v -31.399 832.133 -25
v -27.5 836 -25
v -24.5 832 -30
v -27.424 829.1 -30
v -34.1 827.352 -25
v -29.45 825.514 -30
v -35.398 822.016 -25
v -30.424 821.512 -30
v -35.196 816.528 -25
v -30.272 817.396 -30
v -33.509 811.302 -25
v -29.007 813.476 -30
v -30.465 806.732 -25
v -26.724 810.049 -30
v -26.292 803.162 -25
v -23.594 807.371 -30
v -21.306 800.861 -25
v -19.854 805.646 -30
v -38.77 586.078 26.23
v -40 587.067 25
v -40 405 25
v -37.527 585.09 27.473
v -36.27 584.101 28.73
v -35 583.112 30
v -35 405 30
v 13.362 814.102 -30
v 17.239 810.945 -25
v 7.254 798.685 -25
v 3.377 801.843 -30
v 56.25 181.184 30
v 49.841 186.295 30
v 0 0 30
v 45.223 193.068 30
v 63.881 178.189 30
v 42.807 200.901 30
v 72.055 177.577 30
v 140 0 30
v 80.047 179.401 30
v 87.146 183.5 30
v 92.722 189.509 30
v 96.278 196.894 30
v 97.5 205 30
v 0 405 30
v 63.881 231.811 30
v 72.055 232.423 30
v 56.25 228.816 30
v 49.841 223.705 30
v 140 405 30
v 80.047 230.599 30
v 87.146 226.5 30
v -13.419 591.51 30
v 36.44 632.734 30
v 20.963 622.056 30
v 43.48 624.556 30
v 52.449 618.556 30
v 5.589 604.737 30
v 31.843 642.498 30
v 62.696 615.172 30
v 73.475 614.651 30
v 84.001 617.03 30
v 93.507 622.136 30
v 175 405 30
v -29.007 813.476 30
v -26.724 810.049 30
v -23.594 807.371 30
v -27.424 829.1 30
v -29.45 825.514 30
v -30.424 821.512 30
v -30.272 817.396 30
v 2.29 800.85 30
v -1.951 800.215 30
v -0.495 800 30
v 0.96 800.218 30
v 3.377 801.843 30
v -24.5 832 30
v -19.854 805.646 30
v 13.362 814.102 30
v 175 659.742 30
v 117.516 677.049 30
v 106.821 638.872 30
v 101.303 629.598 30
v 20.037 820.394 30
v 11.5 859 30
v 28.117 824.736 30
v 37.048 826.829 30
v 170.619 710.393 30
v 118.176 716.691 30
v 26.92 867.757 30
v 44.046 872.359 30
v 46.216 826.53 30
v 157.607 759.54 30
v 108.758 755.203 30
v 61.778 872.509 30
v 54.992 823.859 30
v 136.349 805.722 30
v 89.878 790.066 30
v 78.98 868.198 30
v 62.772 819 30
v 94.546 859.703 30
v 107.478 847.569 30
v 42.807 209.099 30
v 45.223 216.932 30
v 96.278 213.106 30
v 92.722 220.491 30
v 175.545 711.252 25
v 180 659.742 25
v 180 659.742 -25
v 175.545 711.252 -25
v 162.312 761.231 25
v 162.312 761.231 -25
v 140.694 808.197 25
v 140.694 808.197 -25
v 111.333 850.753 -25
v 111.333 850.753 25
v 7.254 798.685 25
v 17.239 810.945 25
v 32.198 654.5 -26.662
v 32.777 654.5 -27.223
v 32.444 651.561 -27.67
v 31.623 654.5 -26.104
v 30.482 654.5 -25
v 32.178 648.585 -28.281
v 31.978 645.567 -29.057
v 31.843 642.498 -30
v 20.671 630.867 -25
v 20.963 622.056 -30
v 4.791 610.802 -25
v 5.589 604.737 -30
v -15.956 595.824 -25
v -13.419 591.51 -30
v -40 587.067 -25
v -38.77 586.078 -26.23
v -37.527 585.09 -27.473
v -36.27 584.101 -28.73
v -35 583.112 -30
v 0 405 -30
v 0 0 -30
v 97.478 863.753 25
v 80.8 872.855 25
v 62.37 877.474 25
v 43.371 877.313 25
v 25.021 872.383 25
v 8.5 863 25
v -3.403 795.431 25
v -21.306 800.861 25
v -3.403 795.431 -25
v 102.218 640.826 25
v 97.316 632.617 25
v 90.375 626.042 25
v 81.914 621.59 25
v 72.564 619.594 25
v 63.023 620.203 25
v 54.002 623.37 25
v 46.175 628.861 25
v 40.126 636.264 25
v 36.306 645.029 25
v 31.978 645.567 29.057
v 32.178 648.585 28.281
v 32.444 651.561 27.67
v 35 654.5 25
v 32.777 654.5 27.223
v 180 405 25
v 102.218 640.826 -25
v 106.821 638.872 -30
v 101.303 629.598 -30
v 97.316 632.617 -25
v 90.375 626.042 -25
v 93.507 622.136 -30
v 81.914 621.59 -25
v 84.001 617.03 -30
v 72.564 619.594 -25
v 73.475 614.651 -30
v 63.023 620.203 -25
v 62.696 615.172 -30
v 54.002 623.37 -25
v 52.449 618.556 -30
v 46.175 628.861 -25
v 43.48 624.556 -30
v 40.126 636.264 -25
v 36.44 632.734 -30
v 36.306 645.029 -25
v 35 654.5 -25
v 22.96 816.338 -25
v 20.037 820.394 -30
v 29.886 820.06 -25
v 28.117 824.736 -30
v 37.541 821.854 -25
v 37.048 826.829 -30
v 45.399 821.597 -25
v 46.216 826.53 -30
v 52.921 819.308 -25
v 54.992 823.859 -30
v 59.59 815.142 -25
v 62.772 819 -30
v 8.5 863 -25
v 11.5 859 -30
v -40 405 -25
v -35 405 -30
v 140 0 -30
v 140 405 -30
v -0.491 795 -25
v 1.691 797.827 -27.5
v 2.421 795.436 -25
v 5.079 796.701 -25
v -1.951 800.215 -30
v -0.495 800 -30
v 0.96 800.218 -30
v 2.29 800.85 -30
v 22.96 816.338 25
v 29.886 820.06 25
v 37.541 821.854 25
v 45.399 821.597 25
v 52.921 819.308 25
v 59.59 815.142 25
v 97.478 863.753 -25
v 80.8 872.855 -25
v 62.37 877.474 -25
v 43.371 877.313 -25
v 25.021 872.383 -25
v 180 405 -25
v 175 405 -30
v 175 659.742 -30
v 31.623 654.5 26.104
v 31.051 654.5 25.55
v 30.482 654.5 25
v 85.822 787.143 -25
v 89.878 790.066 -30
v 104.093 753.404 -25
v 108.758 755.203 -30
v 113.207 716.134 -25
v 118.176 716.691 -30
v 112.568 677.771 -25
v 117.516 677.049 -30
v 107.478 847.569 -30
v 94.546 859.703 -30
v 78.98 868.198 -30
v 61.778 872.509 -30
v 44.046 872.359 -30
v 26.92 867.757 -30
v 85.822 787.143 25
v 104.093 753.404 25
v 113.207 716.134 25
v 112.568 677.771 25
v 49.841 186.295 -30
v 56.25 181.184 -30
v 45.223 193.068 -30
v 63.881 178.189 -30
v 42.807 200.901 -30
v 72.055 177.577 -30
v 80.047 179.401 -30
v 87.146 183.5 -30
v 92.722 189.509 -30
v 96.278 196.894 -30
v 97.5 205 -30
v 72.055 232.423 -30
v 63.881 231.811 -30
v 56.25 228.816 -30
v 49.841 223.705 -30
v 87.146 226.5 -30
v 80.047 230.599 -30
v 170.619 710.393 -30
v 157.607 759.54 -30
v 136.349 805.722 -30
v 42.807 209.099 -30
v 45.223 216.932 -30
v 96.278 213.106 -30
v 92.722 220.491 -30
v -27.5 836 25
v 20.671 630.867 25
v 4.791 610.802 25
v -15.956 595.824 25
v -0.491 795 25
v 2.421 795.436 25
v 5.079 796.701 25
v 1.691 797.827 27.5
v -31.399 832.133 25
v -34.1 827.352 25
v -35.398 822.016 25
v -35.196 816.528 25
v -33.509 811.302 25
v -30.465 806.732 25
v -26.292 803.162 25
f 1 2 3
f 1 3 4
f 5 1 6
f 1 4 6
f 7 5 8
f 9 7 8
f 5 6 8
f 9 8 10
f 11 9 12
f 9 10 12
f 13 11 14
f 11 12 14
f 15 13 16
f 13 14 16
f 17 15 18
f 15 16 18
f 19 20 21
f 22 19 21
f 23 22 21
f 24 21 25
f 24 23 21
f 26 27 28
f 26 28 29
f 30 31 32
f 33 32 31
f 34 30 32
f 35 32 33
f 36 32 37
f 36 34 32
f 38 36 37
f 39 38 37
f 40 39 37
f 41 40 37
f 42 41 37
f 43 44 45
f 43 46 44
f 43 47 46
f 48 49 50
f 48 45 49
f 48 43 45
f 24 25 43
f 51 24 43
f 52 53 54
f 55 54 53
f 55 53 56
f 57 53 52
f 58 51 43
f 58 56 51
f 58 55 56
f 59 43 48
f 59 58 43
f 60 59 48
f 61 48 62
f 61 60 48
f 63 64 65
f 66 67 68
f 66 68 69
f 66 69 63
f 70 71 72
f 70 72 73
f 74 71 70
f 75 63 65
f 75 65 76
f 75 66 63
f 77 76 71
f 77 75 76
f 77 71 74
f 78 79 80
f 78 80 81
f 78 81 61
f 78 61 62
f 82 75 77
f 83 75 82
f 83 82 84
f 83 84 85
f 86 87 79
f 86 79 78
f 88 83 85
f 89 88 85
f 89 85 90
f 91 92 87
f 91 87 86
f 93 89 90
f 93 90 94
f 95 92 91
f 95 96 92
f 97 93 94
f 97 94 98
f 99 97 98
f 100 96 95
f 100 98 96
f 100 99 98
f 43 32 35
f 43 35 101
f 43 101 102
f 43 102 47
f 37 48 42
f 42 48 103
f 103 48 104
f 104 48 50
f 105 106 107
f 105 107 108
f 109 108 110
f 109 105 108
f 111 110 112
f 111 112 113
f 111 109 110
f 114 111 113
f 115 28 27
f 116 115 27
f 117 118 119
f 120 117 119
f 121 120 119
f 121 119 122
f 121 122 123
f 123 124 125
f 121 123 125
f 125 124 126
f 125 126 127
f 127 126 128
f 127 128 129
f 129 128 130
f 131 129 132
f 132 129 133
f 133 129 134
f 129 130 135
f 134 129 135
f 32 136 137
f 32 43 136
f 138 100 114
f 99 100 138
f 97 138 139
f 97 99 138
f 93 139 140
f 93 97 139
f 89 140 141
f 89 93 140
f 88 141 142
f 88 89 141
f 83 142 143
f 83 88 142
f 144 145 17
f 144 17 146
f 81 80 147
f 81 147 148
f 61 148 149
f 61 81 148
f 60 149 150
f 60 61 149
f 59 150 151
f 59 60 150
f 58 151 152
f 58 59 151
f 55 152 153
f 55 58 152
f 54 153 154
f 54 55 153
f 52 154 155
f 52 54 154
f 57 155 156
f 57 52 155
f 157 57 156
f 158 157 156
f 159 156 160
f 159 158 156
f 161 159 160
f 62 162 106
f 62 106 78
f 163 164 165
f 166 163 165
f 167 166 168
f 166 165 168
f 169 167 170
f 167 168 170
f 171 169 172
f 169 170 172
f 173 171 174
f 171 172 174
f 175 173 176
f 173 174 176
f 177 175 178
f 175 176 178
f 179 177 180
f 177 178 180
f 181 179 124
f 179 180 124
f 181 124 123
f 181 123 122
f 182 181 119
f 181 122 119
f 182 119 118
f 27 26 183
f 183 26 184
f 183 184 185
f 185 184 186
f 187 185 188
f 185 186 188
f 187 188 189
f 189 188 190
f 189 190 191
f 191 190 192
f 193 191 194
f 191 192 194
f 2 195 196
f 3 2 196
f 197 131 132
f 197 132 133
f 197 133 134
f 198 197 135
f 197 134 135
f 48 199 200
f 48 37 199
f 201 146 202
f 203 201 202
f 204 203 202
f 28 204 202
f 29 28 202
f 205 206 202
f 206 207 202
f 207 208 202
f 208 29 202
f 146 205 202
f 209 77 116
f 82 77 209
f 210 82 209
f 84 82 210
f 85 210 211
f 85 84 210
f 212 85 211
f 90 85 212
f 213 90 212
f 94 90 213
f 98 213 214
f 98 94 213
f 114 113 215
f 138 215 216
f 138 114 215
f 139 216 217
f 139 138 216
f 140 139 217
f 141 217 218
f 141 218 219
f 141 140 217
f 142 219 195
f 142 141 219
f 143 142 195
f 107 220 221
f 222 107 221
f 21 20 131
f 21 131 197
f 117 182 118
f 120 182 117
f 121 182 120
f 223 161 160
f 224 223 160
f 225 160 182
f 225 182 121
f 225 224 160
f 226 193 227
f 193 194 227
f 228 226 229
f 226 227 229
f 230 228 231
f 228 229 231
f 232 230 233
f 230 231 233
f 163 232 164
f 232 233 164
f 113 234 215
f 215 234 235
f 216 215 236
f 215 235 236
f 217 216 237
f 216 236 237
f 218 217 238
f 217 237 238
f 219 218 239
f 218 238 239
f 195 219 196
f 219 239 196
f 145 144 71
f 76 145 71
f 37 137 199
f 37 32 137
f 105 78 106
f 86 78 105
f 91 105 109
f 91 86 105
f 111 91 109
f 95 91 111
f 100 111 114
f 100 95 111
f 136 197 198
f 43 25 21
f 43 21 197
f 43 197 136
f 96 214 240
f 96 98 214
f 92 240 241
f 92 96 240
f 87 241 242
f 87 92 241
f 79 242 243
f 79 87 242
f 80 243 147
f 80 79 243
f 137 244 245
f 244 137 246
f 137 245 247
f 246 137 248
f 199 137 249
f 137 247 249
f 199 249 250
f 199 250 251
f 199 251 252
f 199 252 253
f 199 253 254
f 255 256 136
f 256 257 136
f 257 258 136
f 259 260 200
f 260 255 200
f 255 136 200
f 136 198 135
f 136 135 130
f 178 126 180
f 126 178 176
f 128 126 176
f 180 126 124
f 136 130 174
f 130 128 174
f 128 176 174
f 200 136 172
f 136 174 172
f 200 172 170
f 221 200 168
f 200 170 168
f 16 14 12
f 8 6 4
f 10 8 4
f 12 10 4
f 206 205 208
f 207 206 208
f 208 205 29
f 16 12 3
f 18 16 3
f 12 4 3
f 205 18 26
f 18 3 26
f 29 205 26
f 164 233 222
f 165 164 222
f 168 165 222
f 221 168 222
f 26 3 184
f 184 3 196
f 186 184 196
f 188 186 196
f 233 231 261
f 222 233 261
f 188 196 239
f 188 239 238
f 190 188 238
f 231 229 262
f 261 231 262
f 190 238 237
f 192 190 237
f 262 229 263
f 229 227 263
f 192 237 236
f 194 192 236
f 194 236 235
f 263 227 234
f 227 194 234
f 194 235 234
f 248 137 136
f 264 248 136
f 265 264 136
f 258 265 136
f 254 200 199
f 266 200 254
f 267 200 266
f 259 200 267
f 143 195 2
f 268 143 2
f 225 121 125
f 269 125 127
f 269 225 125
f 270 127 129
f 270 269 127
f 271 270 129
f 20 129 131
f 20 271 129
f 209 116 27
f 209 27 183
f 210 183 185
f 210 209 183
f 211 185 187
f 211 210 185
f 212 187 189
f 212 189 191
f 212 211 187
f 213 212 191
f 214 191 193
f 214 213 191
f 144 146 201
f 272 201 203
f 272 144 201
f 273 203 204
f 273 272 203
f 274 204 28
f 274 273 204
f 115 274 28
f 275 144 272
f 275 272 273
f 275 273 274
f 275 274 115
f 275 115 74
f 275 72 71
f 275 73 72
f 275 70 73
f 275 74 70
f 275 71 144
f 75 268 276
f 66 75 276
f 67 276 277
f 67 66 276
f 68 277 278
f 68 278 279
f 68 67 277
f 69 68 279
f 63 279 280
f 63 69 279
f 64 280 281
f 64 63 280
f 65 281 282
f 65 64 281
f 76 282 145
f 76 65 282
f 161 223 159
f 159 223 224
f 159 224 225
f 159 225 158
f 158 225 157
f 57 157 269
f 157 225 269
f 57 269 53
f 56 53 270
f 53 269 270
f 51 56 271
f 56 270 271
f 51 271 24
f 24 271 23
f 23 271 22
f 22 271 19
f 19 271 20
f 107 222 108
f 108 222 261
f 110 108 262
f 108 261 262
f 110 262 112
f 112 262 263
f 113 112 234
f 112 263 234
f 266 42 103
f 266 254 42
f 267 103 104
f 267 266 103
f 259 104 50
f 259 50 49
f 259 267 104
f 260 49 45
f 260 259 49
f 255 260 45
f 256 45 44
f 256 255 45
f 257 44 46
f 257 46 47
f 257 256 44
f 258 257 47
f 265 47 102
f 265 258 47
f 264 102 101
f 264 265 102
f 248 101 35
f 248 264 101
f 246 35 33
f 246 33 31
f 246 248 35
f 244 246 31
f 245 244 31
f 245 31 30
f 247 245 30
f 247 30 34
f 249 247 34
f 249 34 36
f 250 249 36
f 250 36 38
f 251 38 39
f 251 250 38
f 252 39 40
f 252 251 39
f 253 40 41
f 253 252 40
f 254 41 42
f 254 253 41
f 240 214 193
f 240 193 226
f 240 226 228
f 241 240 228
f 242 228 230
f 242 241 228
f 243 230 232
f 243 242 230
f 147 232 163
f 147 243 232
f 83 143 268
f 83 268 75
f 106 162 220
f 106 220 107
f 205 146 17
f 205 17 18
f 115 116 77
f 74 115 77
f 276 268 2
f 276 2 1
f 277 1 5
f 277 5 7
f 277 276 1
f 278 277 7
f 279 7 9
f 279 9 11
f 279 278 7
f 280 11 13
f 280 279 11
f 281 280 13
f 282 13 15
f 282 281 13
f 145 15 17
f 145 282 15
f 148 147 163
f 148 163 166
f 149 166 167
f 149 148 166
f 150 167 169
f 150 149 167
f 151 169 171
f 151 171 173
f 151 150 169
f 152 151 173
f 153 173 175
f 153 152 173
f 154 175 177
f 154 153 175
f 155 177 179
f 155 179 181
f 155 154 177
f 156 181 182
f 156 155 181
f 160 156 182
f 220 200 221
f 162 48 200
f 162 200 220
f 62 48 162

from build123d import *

# Parameters (mm, degrees)
SKETCH_1_R      = 27.5
EXTRUDE_1_DEPTH = 30
CHAMFER_1_SIZE  = 5


with BuildPart() as part:
    # 草图1 → 凸台-拉伸1 (new, symmetric)
    with BuildSketch(Plane.XY):
        with BuildLine():
            Line((140, 405), (180, 405))
            Line((180, 405), (180, 659.74236495))
            ThreePointArc((180, 659.74236495), (162.31188427, 761.231280601), (111.333333333, 850.752545017))
            ThreePointArc((111.333333333, 850.752545017), (62.369816768, 877.473662126), (8.5, 863))
            Line((8.5, 863), (-27.5, 836))
            ThreePointArc((-27.5, 836), (-35.196294357, 816.527826528), (-21.305524623, 800.861142044))
            Line((-21.305524623, 800.861142044), (-3.402762311, 795.430571022))
            ThreePointArc((-3.402762311, 795.430571022), (2.420792013, 795.436058657), (7.253794336, 798.685043674))
            Line((7.253794336, 798.685043674), (17.238616993, 810.944868978))
            ThreePointArc((17.238616993, 810.944868978), (37.541078237, 821.853723084), (59.589937945, 815.142477595))
            ThreePointArc((59.589937945, 815.142477595), (109.84673197, 735.06182538), (102.218185324, 640.825624899))
            ThreePointArc((102.218185324, 640.825624899), (63.022768685, 620.202503835), (35, 654.5))
            Line((35, 654.5), (30.481942633, 654.5))
            ThreePointArc((30.481942633, 654.5), (4.791252117, 610.80152605), (-40, 587.067332603))
            Line((-40, 587.067332603), (-40, 405))
            Line((-40, 405), (0, 405))
            Line((0, 405), (0, 0))
            Line((0, 0), (140, 0))
            Line((140, 0), (140, 405))
        make_face()
        with Locations((70, 205)):
            Circle(SKETCH_1_R, mode=Mode.SUBTRACT)
    extrude(amount=EXTRUDE_1_DEPTH, both=True)

    # 倒角1
    # the kernel refuses this chamfer: 5 mm, written as the material it takes off along each edge
    with BuildSketch(Plane(origin=(-59.5, 678, -30), x_dir=(0.9931437230377144, -0.11689972365573639, 0), z_dir=(0.11689972365573639, 0.9931437230377144, 0))) as chamfer_1_piece_1:
        Polygon((93, -CHAMFER_1_SIZE), (93 + CHAMFER_1_SIZE, 0), (93, 0), align=None)
    revolve(axis=Axis((-59.5, 678, -30), (0, 0, -1)), revolution_arc=79.106771972, mode=Mode.SUBTRACT)
    with BuildSketch(Plane(origin=(-59.5, 678, 30), x_dir=(0.9931437230377144, -0.11689972365573639, 0), z_dir=(0.11689972365573639, 0.9931437230377144, 0))) as chamfer_1_piece_2:
        Polygon((93 + CHAMFER_1_SIZE, 0), (93, CHAMFER_1_SIZE), (93, 0), align=None)
    revolve(axis=Axis((-59.5, 678, 30), (0, 0, -1)), revolution_arc=79.106771972, mode=Mode.SUBTRACT)
    with BuildSketch(Plane(origin=(180, 392.14158506, -30), x_dir=(0.0274958766105877, 0, 0.9996219169112968), z_dir=(0, 1, 0))) as chamfer_1_piece_3:
        Polygon((CHAMFER_1_SIZE * 0.999621916911, -CHAMFER_1_SIZE * 0.0274958766106), (-CHAMFER_1_SIZE * 0.0274958766106, -CHAMFER_1_SIZE * 0.999621916911), (0, 0), align=None)
    extrude(amount=267.60077989, mode=Mode.SUBTRACT)
    with BuildSketch(Plane(origin=(-120, 659.74236495, -30), x_dir=(1, 0, 0), z_dir=(0, -1, 0))) as chamfer_1_piece_4:
        Polygon((300, CHAMFER_1_SIZE), (300 - CHAMFER_1_SIZE, 0), (300, 0), align=None)
    revolve(axis=Axis((-120, 659.74236495, -30), (0, 0, 1)), revolution_arc=39.546229231, mode=Mode.SUBTRACT)
    with BuildSketch(Plane(origin=(53.5, 803, -30), x_dir=(0.7711111111111113, 0.6367006002203762, 0), z_dir=(0.6367006002203762, -0.7711111111111113, 0))) as chamfer_1_piece_5:
        Polygon((75, CHAMFER_1_SIZE), (75 - CHAMFER_1_SIZE, 0), (75, 0), align=None)
    revolve(axis=Axis((53.5, 803, -30), (0, 0, 1)), revolution_arc=87.323668415, mode=Mode.SUBTRACT)
    with BuildSketch(Plane(origin=(8.5, 863, -30), x_dir=(-0.01649752596635013, 0.02199670128846693, 0.9996219169112968), z_dir=(-0.8000000000000013, -0.5999999999999984, 0))) as chamfer_1_piece_6:
        Polygon((CHAMFER_1_SIZE * 0.999621916911, -CHAMFER_1_SIZE * 0.0274958766106), (-CHAMFER_1_SIZE * 0.0274958766106, -CHAMFER_1_SIZE * 0.999621916911), (0, 0), align=None)
    extrude(amount=45, mode=Mode.SUBTRACT)
    with BuildSketch(Plane(origin=(-15.5, 820, -30), x_dir=(-0.6000000000000103, 0.7999999999999922, 0), z_dir=(0.7999999999999922, 0.6000000000000103, 0))) as chamfer_1_piece_7:
        Polygon((20, CHAMFER_1_SIZE), (20 - CHAMFER_1_SIZE, 0), (20, 0), align=None)
    revolve(axis=Axis((-15.5, 820, -30), (0, 0, 1)), revolution_arc=126.255608056, mode=Mode.SUBTRACT)
    with BuildSketch(Plane(origin=(-21.305524623, 800.861142044, -30), x_dir=(-0.007981399434105696, -0.02631198384115636, 0.9996219169112971), z_dir=(0.9569428977956573, -0.29027623112898887, 0))) as chamfer_1_piece_8:
        Polygon((CHAMFER_1_SIZE * 0.999621916911, -CHAMFER_1_SIZE * 0.0274958766106), (-CHAMFER_1_SIZE * 0.0274958766106, -CHAMFER_1_SIZE * 0.999621916911), (0, 0), align=None)
    extrude(amount=18.708286934, mode=Mode.SUBTRACT)
    with BuildSketch(Plane(origin=(-0.5, 805, -30), x_dir=(-0.29027623112897577, -0.9569428977956612, 0), z_dir=(-0.9569428977956612, 0.29027623112897577, 0))) as chamfer_1_piece_9:
        Polygon((10, CHAMFER_1_SIZE), (10 - CHAMFER_1_SIZE, 0), (10, 0), align=None)
    revolve(axis=Axis((-0.5, 805, -30), (0, 0, 1)), revolution_arc=67.7139403, mode=Mode.SUBTRACT)
    with BuildSketch(Plane(origin=(7.253794336, 798.685043674, -30), x_dir=(0.021319737231601184, -0.01736352599446127, 0.9996219169112965), z_dir=(0.6314956326132553, 0.7753794335616496, 0))) as chamfer_1_piece_10:
        Polygon((CHAMFER_1_SIZE * 0.999621916911, -CHAMFER_1_SIZE * 0.0274958766106), (-CHAMFER_1_SIZE * 0.0274958766106, -CHAMFER_1_SIZE * 0.999621916911), (0, 0), align=None)
    extrude(amount=15.811388301, mode=Mode.SUBTRACT)
    with BuildSketch(Plane(origin=(40.5, 792, -30), x_dir=(-0.7753794335616501, 0.6314956326132546, 0), z_dir=(-0.6314956326132546, -0.7753794335616501, 0))) as chamfer_1_piece_11:
        Polygon((30, -CHAMFER_1_SIZE), (30 + CHAMFER_1_SIZE, 0), (30, 0), align=None)
    revolve(axis=Axis((40.5, 792, -30), (0, 0, -1)), revolution_arc=90.358237971, mode=Mode.SUBTRACT)
    with BuildSketch(Plane(origin=(-35.85975178, 699.430089618, -30), x_dir=(0.6363312648327024, 0.7714159198489573, 0), z_dir=(-0.7714159198489573, 0.6363312648327024, 0))) as chamfer_1_piece_12:
        Polygon((150, -CHAMFER_1_SIZE), (150 + CHAMFER_1_SIZE, 0), (150, 0), align=None)
    revolve(axis=Axis((-35.85975178, 699.430089618, -30), (0, 0, -1)), revolution_arc=73.479048371, mode=Mode.SUBTRACT)
    with BuildSketch(Plane(origin=(70, 654.5, -30), x_dir=(0.920519580694994, -0.39069643146196303, 0), z_dir=(0.39069643146196303, 0.920519580694994, 0))) as chamfer_1_piece_13:
        Polygon((35, -CHAMFER_1_SIZE), (35 + CHAMFER_1_SIZE, 0), (35, 0), align=None)
    revolve(axis=Axis((70, 654.5, -30), (0, 0, -1)), revolution_arc=178.077418405, mode=Mode.SUBTRACT)
    with BuildSketch(Plane(origin=(180, 392.14158506, 30), x_dir=(0.0274958766105877, 0, -0.9996219169112968), z_dir=(0, 1, 0))) as chamfer_1_piece_14:
        Polygon((CHAMFER_1_SIZE * 0.999621916911, CHAMFER_1_SIZE * 0.0274958766106), (-CHAMFER_1_SIZE * 0.0274958766106, CHAMFER_1_SIZE * 0.999621916911), (0, 0), align=None)
    extrude(amount=267.60077989, mode=Mode.SUBTRACT)
    with BuildSketch(Plane(origin=(-120, 659.74236495, 30), x_dir=(1, 0, 0), z_dir=(0, -1, 0))) as chamfer_1_piece_15:
        Polygon((300, -CHAMFER_1_SIZE), (300 - CHAMFER_1_SIZE, 0), (300, 0), align=None)
    revolve(axis=Axis((-120, 659.74236495, 30), (0, 0, 1)), revolution_arc=39.546229231, mode=Mode.SUBTRACT)
    with BuildSketch(Plane(origin=(53.5, 803, 30), x_dir=(0.7711111111111113, 0.6367006002203762, 0), z_dir=(0.6367006002203762, -0.7711111111111113, 0))) as chamfer_1_piece_16:
        Polygon((75, -CHAMFER_1_SIZE), (75 - CHAMFER_1_SIZE, 0), (75, 0), align=None)
    revolve(axis=Axis((53.5, 803, 30), (0, 0, 1)), revolution_arc=87.323668415, mode=Mode.SUBTRACT)
    with BuildSketch(Plane(origin=(8.5, 863, 30), x_dir=(-0.01649752596635013, 0.02199670128846693, -0.9996219169112968), z_dir=(-0.8000000000000013, -0.5999999999999984, 0))) as chamfer_1_piece_17:
        Polygon((CHAMFER_1_SIZE * 0.999621916911, CHAMFER_1_SIZE * 0.0274958766106), (-CHAMFER_1_SIZE * 0.0274958766106, CHAMFER_1_SIZE * 0.999621916911), (0, 0), align=None)
    extrude(amount=45, mode=Mode.SUBTRACT)
    with BuildSketch(Plane(origin=(-15.5, 820, 30), x_dir=(-0.6000000000000103, 0.7999999999999922, 0), z_dir=(0.7999999999999922, 0.6000000000000103, 0))) as chamfer_1_piece_18:
        Polygon((20, -CHAMFER_1_SIZE), (20 - CHAMFER_1_SIZE, 0), (20, 0), align=None)
    revolve(axis=Axis((-15.5, 820, 30), (0, 0, 1)), revolution_arc=126.255608056, mode=Mode.SUBTRACT)
    with BuildSketch(Plane(origin=(-21.305524623, 800.861142044, 30), x_dir=(-0.007981399434105696, -0.02631198384115636, -0.9996219169112971), z_dir=(0.9569428977956573, -0.29027623112898887, 0))) as chamfer_1_piece_19:
        Polygon((CHAMFER_1_SIZE * 0.999621916911, CHAMFER_1_SIZE * 0.0274958766106), (-CHAMFER_1_SIZE * 0.0274958766106, CHAMFER_1_SIZE * 0.999621916911), (0, 0), align=None)
    extrude(amount=18.708286934, mode=Mode.SUBTRACT)
    with BuildSketch(Plane(origin=(-0.5, 805, 30), x_dir=(-0.29027623112897577, -0.9569428977956612, 0), z_dir=(-0.9569428977956612, 0.29027623112897577, 0))) as chamfer_1_piece_20:
        Polygon((10, -CHAMFER_1_SIZE), (10 - CHAMFER_1_SIZE, 0), (10, 0), align=None)
    revolve(axis=Axis((-0.5, 805, 30), (0, 0, 1)), revolution_arc=67.7139403, mode=Mode.SUBTRACT)
    with BuildSketch(Plane(origin=(7.253794336, 798.685043674, 30), x_dir=(0.021319737231601184, -0.01736352599446127, -0.9996219169112965), z_dir=(0.6314956326132553, 0.7753794335616496, 0))) as chamfer_1_piece_21:
        Polygon((CHAMFER_1_SIZE * 0.999621916911, CHAMFER_1_SIZE * 0.0274958766106), (-CHAMFER_1_SIZE * 0.0274958766106, CHAMFER_1_SIZE * 0.999621916911), (0, 0), align=None)
    extrude(amount=15.811388301, mode=Mode.SUBTRACT)
    with BuildSketch(Plane(origin=(40.5, 792, 30), x_dir=(-0.7753794335616501, 0.6314956326132546, 0), z_dir=(-0.6314956326132546, -0.7753794335616501, 0))) as chamfer_1_piece_22:
        Polygon((30, CHAMFER_1_SIZE), (30 + CHAMFER_1_SIZE, 0), (30, 0), align=None)
    revolve(axis=Axis((40.5, 792, 30), (0, 0, -1)), revolution_arc=90.358237971, mode=Mode.SUBTRACT)
    with BuildSketch(Plane(origin=(-35.85975178, 699.430089618, 30), x_dir=(0.6363312648327024, 0.7714159198489573, 0), z_dir=(-0.7714159198489573, 0.6363312648327024, 0))) as chamfer_1_piece_23:
        Polygon((150, CHAMFER_1_SIZE), (150 + CHAMFER_1_SIZE, 0), (150, 0), align=None)
    revolve(axis=Axis((-35.85975178, 699.430089618, 30), (0, 0, -1)), revolution_arc=73.479048371, mode=Mode.SUBTRACT)
    with BuildSketch(Plane(origin=(70, 654.5, 30), x_dir=(0.920519580694994, -0.39069643146196303, 0), z_dir=(0.39069643146196303, 0.920519580694994, 0))) as chamfer_1_piece_24:
        Polygon((35, CHAMFER_1_SIZE), (35 + CHAMFER_1_SIZE, 0), (35, 0), align=None)
    revolve(axis=Axis((70, 654.5, 30), (0, 0, -1)), revolution_arc=178.077418405, mode=Mode.SUBTRACT)
    with BuildSketch(Plane(origin=(-40, 599.925747542, -30), x_dir=(-0.027495876610586317, 0, 0.9996219169112968), z_dir=(0, -1, 0))) as chamfer_1_piece_25:
        Polygon((CHAMFER_1_SIZE * 0.999621916911, -CHAMFER_1_SIZE * 0.0274958766106), (-CHAMFER_1_SIZE * 0.0274958766106, -CHAMFER_1_SIZE * 0.999621916911), (0, 0), align=None)
    extrude(amount=207.784162482, mode=Mode.SUBTRACT)
    with BuildSketch(Plane(origin=(-40, 599.925747542, 30), x_dir=(-0.027495876610586317, 0, -0.9996219169112968), z_dir=(0, -1, 0))) as chamfer_1_piece_26:
        Polygon((CHAMFER_1_SIZE * 0.999621916911, CHAMFER_1_SIZE * 0.0274958766106), (-CHAMFER_1_SIZE * 0.0274958766106, CHAMFER_1_SIZE * 0.999621916911), (0, 0), align=None)
    extrude(amount=207.784162482, mode=Mode.SUBTRACT)


solid = part.part
